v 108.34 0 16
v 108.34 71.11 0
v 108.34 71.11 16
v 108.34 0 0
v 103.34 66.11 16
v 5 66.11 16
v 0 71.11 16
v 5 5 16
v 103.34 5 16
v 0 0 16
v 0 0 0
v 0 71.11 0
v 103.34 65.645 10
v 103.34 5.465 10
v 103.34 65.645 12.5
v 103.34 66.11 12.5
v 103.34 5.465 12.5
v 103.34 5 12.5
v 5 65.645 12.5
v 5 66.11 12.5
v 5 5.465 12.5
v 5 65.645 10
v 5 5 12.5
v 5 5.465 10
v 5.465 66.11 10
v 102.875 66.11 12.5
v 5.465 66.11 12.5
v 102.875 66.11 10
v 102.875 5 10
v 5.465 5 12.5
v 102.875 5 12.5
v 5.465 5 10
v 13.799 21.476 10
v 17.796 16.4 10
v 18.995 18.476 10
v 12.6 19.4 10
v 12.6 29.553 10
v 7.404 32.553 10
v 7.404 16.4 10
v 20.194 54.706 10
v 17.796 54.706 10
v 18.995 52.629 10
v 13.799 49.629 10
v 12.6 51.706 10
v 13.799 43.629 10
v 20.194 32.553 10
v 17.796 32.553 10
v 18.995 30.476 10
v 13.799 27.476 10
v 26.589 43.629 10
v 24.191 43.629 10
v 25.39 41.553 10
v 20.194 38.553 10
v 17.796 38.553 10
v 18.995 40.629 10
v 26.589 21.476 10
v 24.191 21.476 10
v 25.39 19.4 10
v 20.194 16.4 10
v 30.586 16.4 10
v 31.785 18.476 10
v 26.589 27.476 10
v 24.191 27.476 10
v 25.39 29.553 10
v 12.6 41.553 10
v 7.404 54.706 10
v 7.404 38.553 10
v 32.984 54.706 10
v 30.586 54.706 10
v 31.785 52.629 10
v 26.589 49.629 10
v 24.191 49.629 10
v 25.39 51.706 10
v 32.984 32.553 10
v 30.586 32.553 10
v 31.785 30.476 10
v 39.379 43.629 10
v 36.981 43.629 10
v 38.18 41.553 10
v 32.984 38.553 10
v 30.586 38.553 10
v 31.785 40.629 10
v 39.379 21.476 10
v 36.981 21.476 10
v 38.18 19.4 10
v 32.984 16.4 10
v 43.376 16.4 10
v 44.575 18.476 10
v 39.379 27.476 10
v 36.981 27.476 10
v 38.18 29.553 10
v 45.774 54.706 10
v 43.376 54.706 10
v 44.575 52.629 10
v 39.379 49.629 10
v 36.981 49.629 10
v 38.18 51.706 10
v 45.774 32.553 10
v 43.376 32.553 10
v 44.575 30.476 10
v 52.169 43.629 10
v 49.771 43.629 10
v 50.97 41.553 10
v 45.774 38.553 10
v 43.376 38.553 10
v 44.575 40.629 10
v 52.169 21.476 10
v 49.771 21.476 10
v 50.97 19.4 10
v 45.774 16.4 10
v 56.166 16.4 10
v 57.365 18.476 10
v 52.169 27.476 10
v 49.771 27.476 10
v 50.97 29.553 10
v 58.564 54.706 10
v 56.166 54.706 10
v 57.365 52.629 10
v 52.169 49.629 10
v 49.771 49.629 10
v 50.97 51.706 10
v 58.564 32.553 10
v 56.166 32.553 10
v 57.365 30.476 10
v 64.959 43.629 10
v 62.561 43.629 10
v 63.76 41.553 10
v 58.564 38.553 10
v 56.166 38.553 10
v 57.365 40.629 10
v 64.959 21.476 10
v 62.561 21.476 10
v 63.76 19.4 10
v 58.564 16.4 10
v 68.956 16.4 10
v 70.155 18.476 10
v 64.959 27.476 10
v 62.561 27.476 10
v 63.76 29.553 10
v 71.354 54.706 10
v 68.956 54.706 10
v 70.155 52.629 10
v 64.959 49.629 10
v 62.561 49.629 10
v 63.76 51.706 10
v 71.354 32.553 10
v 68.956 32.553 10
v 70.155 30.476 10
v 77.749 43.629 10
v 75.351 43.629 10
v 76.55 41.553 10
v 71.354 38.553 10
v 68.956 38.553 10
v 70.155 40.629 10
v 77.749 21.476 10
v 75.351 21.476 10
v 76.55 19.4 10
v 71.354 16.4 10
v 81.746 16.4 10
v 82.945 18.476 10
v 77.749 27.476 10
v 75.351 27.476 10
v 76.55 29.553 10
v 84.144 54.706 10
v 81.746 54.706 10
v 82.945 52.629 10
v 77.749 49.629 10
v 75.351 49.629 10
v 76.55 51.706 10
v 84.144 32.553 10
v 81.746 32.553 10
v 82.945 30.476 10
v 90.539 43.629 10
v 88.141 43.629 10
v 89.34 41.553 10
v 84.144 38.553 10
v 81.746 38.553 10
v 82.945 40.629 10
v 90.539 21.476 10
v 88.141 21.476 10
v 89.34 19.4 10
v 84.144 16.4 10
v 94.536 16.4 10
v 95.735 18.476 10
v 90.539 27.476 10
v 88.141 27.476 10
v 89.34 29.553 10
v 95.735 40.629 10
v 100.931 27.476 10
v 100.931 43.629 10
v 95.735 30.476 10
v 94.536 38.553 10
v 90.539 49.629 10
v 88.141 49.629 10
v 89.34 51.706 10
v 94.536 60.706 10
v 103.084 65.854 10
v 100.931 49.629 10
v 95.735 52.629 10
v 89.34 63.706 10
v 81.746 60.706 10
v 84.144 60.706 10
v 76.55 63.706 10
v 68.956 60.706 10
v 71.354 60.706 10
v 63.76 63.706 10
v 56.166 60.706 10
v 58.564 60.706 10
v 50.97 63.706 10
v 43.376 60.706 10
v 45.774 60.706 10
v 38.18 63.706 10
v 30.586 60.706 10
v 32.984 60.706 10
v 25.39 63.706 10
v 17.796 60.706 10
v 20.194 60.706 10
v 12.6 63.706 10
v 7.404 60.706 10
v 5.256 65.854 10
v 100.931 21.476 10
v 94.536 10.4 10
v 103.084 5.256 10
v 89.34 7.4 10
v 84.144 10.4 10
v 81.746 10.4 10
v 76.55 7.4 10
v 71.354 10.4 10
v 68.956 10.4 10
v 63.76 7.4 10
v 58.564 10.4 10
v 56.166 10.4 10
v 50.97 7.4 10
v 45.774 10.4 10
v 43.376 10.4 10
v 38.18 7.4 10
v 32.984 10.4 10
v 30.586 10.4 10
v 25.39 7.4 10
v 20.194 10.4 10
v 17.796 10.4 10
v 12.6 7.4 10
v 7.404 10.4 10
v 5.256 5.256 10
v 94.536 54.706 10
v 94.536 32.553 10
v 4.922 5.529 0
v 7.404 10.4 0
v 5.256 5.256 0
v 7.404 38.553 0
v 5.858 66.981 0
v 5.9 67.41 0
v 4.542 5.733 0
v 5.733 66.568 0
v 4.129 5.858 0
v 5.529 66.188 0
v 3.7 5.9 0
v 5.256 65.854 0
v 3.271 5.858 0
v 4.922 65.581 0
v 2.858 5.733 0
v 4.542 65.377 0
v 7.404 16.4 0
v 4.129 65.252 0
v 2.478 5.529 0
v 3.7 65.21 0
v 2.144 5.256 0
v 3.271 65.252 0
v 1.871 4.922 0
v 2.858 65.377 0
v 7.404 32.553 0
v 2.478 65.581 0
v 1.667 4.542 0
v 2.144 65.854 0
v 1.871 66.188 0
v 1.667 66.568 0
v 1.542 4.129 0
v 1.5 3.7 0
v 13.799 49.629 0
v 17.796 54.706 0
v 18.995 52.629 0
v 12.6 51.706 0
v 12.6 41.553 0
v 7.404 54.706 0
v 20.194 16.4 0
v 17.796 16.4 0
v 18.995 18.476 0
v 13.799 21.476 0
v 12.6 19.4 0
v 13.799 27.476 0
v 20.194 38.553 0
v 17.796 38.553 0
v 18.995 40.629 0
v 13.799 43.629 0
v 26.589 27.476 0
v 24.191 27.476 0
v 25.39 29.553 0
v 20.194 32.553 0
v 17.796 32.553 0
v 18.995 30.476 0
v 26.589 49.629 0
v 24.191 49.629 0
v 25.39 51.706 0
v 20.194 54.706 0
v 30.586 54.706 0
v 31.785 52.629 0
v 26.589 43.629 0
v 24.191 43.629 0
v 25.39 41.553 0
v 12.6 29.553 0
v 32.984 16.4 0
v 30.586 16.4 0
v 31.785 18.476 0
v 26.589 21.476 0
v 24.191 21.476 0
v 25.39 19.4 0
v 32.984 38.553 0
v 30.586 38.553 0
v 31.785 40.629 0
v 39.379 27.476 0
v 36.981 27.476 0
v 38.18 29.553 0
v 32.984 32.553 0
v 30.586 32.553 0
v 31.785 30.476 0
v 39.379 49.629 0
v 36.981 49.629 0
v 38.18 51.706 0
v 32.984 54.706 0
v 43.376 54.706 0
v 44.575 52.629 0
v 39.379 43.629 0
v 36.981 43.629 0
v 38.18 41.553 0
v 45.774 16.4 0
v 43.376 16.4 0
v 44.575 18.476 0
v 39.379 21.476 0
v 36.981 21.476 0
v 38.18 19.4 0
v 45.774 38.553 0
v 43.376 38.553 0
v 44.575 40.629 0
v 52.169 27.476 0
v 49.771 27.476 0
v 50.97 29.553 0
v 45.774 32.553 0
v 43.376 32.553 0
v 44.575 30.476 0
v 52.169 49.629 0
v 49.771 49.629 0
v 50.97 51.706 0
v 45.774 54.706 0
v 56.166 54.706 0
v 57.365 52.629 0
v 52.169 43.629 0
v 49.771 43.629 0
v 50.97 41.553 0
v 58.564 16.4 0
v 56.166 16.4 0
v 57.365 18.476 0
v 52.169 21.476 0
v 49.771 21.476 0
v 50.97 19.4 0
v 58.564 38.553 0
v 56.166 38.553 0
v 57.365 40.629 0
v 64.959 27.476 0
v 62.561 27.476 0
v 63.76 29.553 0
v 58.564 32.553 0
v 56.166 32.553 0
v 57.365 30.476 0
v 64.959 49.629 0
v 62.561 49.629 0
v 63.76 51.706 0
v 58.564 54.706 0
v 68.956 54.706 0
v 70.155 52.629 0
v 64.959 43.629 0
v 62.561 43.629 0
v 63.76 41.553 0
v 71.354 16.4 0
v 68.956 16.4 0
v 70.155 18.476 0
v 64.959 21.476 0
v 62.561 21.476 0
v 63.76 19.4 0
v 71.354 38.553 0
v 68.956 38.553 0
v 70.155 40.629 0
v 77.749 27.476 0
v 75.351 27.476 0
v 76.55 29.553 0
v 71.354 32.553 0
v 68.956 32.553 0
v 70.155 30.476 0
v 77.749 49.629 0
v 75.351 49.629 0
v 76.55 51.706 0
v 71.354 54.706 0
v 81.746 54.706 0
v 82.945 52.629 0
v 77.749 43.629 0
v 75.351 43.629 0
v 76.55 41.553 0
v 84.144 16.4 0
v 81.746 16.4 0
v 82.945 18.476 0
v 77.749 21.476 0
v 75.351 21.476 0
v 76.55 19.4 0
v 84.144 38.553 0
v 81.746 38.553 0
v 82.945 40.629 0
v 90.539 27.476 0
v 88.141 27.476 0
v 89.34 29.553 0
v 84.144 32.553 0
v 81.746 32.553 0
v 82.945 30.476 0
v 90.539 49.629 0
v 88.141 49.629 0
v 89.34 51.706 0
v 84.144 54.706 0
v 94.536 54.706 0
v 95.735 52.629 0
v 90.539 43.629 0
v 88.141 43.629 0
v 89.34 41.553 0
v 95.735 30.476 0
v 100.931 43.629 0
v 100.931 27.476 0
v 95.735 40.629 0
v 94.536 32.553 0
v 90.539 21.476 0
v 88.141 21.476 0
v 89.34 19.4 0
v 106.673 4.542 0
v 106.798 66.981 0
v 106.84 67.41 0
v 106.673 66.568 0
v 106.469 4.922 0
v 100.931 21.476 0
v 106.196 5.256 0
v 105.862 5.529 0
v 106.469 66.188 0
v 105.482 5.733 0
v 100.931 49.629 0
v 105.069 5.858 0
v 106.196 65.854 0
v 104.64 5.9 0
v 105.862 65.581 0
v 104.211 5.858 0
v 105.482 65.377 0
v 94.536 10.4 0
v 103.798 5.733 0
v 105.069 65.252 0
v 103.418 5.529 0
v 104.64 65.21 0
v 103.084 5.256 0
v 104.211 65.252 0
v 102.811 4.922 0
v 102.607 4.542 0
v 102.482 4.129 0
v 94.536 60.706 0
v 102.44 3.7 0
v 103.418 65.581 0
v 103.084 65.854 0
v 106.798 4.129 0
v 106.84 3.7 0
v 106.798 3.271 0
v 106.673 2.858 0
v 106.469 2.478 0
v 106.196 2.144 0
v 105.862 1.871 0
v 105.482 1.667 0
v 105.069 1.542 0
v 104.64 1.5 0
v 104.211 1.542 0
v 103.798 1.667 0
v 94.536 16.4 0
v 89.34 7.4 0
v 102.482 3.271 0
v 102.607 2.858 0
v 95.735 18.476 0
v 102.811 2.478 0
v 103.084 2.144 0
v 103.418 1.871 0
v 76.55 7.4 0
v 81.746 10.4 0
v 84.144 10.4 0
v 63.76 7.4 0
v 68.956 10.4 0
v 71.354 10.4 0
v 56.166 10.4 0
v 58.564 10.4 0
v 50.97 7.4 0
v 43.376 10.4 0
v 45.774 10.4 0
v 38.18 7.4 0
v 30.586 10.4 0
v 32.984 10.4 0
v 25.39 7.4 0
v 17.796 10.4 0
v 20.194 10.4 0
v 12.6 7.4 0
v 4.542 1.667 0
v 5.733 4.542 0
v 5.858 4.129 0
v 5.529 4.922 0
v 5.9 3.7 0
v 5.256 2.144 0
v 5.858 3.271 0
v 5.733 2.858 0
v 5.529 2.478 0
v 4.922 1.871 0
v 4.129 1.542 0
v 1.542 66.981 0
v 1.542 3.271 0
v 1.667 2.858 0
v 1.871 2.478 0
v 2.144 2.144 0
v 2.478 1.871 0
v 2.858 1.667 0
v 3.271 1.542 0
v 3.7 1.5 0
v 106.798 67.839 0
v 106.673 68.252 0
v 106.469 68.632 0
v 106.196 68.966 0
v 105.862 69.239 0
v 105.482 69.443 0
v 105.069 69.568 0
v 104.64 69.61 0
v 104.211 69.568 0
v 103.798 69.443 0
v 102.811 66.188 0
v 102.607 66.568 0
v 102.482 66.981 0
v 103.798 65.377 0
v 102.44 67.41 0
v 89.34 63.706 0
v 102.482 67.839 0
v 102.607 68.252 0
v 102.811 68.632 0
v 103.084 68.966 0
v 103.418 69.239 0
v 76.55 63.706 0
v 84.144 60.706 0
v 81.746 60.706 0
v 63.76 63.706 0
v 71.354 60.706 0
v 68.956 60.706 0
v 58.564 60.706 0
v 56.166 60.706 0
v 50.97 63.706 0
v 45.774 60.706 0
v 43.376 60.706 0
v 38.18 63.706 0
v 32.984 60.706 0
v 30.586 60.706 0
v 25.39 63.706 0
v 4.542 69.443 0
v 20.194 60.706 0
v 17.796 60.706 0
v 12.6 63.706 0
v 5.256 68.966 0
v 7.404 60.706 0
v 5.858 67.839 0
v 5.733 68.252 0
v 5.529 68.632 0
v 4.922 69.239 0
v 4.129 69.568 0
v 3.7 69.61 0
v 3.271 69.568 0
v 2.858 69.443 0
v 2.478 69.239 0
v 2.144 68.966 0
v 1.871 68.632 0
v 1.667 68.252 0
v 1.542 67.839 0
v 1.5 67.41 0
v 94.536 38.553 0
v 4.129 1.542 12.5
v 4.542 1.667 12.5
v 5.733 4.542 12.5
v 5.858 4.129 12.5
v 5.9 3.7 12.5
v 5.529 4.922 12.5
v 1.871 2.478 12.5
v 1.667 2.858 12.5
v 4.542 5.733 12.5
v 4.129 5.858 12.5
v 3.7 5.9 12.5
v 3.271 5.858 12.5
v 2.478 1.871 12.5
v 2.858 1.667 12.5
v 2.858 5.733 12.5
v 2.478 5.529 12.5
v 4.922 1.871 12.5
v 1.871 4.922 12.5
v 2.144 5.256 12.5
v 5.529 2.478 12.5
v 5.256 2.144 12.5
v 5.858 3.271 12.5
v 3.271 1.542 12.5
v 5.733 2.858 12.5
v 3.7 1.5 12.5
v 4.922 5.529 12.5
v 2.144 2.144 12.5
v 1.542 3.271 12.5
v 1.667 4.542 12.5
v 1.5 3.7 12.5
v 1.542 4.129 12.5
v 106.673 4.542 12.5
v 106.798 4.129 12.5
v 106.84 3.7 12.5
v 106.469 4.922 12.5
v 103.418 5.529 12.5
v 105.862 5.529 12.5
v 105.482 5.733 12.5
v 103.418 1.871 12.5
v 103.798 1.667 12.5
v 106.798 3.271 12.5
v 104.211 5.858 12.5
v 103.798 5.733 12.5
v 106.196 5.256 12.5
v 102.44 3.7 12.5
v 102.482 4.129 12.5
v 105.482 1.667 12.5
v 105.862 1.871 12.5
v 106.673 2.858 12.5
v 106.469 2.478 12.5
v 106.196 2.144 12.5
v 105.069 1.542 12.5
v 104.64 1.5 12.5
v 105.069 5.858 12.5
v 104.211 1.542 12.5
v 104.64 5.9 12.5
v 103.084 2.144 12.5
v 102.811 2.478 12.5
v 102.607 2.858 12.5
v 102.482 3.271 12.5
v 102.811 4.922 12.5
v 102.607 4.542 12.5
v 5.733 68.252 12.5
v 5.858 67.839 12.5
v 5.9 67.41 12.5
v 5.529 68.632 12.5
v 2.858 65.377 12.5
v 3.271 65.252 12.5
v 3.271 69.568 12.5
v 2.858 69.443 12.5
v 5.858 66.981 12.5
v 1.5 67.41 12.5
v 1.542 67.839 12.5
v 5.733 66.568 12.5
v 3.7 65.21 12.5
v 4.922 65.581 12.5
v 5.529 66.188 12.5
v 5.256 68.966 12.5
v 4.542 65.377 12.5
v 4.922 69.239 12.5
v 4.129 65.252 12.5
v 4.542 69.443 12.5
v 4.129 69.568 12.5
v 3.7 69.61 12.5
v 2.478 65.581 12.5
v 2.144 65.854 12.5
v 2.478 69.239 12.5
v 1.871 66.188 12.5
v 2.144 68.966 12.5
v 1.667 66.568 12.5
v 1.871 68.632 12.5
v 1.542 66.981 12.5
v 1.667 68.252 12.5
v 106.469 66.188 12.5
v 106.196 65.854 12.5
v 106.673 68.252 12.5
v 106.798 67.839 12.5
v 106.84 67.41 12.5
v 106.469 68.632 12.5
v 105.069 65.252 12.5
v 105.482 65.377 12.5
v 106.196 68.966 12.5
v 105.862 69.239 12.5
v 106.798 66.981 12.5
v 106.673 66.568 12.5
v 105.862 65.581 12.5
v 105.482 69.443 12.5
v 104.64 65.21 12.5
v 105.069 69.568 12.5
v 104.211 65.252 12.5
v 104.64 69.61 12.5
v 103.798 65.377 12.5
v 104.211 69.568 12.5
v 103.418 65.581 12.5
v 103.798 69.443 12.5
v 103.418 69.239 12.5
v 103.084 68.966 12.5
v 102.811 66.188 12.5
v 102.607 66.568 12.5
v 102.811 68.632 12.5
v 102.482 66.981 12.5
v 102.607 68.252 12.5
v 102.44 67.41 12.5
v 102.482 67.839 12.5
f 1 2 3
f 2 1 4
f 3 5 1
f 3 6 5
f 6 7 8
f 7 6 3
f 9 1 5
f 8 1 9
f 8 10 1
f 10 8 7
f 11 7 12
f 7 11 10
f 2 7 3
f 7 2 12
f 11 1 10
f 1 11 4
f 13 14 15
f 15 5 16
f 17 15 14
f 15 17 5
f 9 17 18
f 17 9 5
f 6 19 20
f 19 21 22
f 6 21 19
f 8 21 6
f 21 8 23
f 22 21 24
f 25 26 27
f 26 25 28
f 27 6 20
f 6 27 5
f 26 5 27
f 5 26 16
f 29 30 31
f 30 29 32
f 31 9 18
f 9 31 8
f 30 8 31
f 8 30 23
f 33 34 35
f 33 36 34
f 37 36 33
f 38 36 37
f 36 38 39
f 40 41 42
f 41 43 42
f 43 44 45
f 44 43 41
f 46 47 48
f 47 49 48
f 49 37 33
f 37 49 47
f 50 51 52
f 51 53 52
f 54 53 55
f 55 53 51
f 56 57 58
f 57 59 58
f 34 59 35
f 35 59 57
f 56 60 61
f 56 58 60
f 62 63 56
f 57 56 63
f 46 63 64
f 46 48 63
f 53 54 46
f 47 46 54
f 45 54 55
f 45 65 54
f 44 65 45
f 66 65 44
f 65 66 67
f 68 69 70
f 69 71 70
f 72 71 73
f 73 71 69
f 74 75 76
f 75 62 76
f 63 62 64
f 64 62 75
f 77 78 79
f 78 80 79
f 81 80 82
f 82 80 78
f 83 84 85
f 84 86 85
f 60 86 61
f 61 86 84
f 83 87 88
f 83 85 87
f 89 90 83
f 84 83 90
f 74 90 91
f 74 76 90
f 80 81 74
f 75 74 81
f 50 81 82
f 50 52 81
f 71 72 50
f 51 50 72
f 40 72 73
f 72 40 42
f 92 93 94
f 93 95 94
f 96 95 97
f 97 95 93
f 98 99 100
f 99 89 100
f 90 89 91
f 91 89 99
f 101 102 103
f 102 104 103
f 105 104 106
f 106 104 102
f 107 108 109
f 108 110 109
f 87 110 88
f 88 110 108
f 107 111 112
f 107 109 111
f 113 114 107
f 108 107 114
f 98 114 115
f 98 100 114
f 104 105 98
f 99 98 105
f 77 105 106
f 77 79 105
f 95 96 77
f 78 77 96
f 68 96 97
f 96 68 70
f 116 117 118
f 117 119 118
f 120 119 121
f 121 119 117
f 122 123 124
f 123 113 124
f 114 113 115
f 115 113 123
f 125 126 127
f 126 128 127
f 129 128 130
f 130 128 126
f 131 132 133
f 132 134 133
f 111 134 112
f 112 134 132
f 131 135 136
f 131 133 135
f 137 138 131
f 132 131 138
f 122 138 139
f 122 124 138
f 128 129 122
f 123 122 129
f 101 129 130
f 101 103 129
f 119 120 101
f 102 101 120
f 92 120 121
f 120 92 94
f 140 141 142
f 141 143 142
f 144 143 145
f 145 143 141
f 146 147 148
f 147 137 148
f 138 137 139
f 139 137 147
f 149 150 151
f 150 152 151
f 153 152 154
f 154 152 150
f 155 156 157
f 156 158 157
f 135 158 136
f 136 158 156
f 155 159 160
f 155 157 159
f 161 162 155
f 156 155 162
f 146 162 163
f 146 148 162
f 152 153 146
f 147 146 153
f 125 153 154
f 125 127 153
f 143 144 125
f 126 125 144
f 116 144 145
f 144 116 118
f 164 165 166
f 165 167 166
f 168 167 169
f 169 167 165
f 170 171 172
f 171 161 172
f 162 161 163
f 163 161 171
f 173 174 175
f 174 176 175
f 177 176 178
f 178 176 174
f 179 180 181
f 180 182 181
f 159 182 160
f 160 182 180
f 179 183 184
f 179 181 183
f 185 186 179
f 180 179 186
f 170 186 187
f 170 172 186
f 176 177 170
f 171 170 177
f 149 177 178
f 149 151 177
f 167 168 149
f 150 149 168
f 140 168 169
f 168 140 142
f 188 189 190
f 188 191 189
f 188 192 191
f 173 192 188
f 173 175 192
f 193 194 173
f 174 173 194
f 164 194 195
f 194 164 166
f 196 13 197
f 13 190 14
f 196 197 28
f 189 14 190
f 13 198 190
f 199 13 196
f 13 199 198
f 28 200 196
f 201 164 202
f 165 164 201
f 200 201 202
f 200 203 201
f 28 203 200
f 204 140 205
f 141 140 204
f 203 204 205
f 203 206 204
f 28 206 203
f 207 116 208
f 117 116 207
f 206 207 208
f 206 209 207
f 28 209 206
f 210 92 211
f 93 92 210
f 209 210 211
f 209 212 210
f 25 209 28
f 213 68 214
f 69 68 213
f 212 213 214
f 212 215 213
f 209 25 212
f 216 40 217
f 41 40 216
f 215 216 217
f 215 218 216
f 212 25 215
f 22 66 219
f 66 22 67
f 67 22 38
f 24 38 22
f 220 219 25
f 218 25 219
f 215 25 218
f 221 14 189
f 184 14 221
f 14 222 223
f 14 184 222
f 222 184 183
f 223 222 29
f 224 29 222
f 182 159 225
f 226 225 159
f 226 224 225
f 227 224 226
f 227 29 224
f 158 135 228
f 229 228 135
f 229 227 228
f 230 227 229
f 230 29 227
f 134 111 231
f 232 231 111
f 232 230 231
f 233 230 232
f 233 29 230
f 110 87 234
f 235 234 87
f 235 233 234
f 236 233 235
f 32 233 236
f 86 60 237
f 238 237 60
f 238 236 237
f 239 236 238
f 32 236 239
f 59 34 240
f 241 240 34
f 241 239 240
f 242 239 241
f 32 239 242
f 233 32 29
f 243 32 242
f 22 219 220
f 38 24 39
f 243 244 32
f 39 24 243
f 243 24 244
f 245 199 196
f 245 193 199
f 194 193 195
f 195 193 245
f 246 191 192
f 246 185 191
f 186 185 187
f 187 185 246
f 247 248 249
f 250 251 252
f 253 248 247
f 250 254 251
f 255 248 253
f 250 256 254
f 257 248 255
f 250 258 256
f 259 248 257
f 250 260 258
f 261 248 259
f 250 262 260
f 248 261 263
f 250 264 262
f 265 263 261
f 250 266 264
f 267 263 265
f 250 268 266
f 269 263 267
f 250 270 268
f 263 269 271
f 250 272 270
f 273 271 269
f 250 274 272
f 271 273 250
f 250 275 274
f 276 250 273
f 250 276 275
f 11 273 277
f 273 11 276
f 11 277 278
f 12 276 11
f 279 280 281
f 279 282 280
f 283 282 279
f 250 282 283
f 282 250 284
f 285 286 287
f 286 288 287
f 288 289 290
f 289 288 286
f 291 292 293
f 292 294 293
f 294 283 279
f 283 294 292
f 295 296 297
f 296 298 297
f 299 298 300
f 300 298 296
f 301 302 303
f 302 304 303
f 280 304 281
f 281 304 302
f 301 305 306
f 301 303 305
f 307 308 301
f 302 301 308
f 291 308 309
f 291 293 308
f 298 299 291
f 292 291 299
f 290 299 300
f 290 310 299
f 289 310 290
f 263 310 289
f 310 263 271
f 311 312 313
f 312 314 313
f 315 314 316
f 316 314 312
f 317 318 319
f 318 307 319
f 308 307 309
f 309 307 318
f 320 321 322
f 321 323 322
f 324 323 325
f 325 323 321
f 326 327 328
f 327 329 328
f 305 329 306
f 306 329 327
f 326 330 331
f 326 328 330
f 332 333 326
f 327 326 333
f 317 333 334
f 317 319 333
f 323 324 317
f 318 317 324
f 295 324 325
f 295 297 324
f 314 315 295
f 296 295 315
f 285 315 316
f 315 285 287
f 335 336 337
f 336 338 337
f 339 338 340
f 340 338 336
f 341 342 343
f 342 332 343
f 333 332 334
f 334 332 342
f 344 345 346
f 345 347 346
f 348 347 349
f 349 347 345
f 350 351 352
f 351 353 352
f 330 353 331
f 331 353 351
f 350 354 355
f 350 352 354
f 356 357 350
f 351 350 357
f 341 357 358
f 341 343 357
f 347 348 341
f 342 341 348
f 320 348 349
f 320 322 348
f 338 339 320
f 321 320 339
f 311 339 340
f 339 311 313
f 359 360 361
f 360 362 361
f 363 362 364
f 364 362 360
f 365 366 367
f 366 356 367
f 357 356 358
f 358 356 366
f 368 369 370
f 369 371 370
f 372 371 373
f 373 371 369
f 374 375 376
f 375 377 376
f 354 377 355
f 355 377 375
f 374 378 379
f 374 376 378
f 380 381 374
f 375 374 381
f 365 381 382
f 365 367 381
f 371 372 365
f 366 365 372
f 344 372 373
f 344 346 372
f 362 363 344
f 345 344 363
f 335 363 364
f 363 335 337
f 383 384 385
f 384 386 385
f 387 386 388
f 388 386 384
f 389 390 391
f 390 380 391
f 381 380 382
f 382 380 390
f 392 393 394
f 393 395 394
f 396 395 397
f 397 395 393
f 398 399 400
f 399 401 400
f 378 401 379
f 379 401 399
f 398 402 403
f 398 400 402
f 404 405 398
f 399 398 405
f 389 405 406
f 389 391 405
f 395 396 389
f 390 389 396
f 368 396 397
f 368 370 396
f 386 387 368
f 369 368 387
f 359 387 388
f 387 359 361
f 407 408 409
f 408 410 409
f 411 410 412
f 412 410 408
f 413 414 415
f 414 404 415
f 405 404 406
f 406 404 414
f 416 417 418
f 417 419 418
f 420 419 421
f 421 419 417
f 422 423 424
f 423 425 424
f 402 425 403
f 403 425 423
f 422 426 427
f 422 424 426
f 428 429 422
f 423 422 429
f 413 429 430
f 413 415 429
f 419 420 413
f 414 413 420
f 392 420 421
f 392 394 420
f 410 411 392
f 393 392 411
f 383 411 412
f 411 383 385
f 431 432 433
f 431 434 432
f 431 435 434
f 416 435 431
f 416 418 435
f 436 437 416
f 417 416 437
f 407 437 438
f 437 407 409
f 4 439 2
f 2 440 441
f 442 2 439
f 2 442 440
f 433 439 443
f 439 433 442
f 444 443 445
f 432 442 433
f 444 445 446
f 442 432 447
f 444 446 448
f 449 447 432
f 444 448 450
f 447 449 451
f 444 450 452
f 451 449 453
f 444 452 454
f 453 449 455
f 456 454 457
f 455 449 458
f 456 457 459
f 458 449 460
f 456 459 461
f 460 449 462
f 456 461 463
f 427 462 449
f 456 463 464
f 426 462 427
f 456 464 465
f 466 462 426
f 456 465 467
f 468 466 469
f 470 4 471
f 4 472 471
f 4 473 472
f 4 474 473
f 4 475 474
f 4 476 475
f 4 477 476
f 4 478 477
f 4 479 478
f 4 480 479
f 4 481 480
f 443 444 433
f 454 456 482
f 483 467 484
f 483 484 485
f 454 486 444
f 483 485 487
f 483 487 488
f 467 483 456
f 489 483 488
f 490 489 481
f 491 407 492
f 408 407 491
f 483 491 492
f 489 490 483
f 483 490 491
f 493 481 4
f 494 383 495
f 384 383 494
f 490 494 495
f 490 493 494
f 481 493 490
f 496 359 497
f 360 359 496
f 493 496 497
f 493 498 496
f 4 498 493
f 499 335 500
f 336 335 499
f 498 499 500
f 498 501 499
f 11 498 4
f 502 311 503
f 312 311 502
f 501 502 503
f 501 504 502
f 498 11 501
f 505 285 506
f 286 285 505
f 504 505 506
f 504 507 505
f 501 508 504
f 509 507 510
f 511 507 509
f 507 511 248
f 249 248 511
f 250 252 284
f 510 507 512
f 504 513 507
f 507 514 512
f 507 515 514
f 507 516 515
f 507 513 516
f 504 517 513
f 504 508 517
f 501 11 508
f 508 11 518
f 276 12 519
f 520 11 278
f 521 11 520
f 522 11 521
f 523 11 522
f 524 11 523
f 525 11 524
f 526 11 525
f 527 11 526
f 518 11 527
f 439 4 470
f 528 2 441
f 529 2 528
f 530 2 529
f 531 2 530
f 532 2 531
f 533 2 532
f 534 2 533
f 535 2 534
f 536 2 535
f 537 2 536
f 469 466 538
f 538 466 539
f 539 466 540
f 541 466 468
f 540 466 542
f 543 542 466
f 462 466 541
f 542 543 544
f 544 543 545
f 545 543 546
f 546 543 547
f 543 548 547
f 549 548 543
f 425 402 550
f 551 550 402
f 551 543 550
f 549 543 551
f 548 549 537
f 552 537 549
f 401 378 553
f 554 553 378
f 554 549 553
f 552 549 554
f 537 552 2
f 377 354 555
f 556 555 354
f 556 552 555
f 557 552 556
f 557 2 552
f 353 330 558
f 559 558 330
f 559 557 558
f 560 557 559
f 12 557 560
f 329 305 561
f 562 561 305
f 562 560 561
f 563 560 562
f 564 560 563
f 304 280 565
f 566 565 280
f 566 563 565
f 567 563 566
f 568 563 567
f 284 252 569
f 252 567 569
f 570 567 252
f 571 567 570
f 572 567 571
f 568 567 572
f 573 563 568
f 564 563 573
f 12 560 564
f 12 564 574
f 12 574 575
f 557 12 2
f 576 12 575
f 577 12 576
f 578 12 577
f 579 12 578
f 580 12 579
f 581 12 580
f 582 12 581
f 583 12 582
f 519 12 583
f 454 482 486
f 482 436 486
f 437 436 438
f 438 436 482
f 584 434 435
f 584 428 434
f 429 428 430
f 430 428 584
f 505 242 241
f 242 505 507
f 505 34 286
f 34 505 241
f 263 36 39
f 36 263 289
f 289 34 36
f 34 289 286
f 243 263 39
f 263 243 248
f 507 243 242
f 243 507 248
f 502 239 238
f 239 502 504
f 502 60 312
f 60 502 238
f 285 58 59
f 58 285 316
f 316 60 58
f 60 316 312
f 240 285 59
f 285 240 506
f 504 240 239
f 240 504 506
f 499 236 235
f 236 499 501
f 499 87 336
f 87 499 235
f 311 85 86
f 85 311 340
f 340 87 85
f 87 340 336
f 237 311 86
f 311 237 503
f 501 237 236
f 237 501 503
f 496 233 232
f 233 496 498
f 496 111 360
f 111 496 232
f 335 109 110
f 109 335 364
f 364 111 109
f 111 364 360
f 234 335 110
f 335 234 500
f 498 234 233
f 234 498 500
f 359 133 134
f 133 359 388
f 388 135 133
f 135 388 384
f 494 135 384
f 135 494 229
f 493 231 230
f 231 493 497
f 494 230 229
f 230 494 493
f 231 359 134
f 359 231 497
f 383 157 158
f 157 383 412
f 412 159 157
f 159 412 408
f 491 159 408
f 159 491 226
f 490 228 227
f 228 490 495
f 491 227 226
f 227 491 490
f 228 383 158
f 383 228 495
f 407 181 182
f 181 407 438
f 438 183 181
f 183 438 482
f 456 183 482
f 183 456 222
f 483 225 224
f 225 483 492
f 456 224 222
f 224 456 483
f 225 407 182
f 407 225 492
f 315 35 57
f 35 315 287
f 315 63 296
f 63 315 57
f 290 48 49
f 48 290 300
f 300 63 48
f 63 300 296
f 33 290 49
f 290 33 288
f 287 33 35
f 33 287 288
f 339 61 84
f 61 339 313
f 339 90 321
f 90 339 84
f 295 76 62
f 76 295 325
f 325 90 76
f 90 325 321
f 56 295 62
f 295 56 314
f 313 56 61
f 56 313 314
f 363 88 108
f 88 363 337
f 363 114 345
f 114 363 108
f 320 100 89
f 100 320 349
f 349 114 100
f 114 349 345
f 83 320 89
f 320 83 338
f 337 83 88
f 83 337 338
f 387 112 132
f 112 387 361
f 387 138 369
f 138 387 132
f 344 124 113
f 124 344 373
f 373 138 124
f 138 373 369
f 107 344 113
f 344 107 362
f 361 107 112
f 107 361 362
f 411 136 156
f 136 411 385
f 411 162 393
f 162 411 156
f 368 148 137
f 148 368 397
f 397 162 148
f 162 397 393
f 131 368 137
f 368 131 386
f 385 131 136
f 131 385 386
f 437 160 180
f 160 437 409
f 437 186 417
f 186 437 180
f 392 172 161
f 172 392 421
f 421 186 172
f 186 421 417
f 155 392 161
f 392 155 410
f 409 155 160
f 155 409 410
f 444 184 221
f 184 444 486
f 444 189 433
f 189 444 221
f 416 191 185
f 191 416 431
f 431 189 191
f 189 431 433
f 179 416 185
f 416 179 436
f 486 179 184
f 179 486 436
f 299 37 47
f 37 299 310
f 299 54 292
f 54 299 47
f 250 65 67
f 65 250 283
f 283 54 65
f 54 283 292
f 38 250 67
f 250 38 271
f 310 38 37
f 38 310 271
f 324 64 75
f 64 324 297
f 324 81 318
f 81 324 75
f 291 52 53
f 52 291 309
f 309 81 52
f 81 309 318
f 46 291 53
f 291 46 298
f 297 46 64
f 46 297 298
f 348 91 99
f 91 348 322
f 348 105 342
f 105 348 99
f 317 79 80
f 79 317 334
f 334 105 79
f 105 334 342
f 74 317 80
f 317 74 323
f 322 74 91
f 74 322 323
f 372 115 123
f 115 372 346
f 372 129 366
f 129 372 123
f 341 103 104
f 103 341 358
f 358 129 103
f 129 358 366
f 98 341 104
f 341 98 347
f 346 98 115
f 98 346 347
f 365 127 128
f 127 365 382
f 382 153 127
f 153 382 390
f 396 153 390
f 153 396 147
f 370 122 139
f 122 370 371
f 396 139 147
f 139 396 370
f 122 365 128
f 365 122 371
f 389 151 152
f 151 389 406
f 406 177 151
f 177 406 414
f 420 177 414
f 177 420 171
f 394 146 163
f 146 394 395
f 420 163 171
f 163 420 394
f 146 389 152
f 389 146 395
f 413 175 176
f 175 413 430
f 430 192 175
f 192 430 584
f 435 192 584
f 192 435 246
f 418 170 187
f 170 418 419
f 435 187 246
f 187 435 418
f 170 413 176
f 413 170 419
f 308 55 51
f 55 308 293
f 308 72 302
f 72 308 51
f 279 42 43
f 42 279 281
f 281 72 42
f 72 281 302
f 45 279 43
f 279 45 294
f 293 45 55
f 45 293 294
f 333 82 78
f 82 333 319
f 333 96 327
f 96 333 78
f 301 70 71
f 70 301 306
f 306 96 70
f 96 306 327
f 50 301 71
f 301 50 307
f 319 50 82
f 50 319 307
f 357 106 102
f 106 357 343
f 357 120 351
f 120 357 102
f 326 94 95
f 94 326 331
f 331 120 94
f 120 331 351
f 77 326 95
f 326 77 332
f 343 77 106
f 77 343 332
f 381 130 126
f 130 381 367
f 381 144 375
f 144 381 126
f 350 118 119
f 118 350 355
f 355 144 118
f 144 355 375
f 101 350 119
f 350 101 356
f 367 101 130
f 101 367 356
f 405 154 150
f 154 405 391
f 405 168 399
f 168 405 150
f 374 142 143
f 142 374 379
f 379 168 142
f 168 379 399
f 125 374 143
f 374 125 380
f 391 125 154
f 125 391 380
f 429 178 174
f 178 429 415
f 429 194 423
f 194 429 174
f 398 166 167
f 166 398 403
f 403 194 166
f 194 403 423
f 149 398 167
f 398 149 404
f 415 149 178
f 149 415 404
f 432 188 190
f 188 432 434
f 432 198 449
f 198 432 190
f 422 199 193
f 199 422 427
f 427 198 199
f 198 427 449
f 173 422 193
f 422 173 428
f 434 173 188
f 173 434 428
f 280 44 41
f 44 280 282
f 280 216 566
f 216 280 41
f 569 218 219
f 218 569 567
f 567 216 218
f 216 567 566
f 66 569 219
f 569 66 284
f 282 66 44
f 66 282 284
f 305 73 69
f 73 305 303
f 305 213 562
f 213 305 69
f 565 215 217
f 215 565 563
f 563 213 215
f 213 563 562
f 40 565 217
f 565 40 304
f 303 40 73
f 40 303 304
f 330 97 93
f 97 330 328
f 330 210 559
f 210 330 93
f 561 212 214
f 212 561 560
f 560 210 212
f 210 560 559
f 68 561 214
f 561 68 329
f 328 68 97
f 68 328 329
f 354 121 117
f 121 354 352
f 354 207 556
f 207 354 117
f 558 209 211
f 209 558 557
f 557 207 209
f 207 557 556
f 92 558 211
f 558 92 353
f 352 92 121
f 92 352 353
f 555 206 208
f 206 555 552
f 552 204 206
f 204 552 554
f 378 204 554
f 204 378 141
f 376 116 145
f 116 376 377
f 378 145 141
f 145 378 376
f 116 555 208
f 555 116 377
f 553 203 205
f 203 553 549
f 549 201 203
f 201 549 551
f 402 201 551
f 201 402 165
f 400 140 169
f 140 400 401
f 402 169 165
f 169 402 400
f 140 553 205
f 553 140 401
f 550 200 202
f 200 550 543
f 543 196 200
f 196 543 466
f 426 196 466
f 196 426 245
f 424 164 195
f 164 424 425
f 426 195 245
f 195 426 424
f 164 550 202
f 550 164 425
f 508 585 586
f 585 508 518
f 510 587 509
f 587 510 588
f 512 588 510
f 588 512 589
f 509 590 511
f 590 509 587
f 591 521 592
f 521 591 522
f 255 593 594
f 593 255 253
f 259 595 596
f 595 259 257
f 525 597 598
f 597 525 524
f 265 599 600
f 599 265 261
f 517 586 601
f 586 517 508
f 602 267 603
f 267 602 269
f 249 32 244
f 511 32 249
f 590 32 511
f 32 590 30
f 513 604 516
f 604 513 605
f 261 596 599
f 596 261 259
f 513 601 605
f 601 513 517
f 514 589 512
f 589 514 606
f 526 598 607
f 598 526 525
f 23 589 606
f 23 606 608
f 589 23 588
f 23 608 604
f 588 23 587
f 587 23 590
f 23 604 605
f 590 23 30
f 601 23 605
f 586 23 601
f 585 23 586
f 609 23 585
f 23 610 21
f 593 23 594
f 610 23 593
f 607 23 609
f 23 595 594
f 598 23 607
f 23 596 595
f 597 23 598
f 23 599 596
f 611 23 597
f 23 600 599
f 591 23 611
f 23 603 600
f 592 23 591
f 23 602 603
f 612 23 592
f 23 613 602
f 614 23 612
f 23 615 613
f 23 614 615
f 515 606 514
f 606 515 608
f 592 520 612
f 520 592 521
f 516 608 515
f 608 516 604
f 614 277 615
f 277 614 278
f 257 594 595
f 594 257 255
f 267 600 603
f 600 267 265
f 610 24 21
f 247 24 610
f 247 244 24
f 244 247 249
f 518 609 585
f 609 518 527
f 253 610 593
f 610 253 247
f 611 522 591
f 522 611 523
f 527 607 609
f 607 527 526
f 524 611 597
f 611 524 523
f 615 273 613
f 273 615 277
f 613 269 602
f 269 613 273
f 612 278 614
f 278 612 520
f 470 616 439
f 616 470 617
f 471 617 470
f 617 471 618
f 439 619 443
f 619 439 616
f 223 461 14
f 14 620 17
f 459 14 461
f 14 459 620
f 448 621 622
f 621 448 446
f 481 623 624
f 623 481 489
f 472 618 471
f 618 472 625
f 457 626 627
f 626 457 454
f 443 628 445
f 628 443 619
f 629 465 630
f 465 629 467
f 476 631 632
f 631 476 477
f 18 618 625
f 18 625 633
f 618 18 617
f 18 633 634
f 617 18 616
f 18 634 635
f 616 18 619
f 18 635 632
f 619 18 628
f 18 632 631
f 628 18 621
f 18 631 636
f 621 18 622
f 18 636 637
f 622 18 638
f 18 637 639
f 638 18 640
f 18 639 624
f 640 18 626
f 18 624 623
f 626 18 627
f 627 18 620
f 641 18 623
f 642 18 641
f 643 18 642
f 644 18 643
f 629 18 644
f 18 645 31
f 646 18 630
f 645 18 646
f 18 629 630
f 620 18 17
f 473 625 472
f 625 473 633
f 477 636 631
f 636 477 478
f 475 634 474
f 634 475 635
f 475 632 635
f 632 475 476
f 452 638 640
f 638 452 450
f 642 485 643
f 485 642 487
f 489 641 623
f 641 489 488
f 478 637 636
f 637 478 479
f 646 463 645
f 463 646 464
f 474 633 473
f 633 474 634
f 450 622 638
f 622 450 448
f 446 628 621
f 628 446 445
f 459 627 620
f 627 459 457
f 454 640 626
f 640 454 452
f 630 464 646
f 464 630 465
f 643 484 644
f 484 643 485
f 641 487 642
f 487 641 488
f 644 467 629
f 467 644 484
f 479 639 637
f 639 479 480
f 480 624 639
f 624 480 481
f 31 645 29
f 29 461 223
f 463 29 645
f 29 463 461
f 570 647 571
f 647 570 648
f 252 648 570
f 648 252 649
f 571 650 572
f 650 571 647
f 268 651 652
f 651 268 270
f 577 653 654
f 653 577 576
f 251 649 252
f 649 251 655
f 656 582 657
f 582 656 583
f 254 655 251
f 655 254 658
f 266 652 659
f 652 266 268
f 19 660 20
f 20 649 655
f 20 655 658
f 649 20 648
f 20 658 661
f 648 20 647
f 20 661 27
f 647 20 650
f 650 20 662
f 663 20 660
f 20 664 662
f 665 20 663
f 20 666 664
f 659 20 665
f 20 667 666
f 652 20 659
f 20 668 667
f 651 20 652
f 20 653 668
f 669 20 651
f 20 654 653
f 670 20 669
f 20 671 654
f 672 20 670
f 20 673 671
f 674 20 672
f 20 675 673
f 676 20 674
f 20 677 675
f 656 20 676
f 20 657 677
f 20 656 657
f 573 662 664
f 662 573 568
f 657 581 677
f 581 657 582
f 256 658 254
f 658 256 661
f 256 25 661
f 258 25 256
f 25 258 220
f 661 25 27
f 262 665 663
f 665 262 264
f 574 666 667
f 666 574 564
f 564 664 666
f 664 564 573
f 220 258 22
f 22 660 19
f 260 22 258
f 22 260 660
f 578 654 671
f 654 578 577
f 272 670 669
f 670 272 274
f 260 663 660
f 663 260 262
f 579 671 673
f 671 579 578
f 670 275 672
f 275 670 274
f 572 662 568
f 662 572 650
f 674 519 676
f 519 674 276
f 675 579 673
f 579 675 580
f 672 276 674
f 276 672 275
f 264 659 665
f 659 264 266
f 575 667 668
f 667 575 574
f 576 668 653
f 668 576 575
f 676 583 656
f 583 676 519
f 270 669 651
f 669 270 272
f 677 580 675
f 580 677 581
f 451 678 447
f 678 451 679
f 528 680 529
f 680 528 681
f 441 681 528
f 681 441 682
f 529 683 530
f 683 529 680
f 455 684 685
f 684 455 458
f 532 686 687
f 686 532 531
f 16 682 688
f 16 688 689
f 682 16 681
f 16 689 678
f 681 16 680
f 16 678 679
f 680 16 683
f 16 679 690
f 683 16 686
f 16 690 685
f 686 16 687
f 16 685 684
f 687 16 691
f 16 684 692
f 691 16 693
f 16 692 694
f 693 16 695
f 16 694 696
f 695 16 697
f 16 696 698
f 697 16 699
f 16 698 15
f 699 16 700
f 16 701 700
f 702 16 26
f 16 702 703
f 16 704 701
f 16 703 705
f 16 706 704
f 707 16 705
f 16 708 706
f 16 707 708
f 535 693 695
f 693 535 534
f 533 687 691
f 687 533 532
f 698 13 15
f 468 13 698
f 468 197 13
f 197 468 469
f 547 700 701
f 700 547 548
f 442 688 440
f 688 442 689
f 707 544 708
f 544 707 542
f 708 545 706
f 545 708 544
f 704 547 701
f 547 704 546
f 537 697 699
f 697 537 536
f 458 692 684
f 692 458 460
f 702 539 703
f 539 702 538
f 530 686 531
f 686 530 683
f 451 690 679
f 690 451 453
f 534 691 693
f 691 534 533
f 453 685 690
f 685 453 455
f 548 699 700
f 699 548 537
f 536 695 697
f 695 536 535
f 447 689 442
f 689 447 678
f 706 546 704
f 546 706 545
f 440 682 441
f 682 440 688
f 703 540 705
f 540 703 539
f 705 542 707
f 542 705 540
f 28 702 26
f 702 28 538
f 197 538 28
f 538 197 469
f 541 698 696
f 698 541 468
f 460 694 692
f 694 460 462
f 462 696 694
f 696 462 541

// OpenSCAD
$fn = 32;

// ----------------------------------------------------------------------
// Honeycomb panel: 108.34 x 71.11 mm, 35 cells of 12 mm
// ----------------------------------------------------------------------

// --- parameters (mm) ---
panel_w = 108.34;         // panel width
panel_d = 71.11;          // panel depth
thick = 10;               // panel thickness
cell_r = 6;               // hex cell circumradius
pitch = 12.79;            // hex cell pitch (centre to centre)
web = 2.4;                // web between the cells
columns = 7;              // columns of cells
rows = 5;                 // rows of cells
cell_count = 35;          // total cells
shift_x = 12.6;           // first cell offset in x
shift_y = 13.4;           // first cell offset in y
mount_d = 4.4;            // corner mounting holes
hole_off = 3.7;           // mounting hole offset from the corners
rim_h = 16;               // rim height
rim_t = 5;                // rim wall thickness

difference() {
  union() {
    cube([panel_w, panel_d, thick]);
    /* rim around the panel, sunk 1 mm into the plate */
    translate([0, 0, thick - 1]) difference() {
      cube([panel_w, panel_d, rim_h - thick + 1]);
      translate([rim_t, rim_t, -2.5]) cube([panel_w - 2 * rim_t, panel_d - 2 * rim_t, rim_h - thick + 6]);
    }
  }
  /* hexagonal cells, point-up, cut right through the plate */
  for (row = [0 : rows - 1]) {
    for (col = [0 : columns - 1]) {
      translate([shift_x + col * pitch + (row % 2) * pitch / 2, shift_y + row * pitch * 0.866025, -2.5]) rotate([0, 0, 30]) cylinder(h = thick + 5, d = 2 * cell_r, $fn = 6);
    }
  }
  /* corner mounting holes, clear of the outer cell web */
  translate([3.7, 3.7, -2.5]) cylinder(h = thick + 5, d = mount_d);
  translate([104.64, 3.7, -2.5]) cylinder(h = thick + 5, d = mount_d);
  translate([3.7, 67.41, -2.5]) cylinder(h = thick + 5, d = mount_d);
  translate([104.64, 67.41, -2.5]) cylinder(h = thick + 5, d = mount_d);
}
